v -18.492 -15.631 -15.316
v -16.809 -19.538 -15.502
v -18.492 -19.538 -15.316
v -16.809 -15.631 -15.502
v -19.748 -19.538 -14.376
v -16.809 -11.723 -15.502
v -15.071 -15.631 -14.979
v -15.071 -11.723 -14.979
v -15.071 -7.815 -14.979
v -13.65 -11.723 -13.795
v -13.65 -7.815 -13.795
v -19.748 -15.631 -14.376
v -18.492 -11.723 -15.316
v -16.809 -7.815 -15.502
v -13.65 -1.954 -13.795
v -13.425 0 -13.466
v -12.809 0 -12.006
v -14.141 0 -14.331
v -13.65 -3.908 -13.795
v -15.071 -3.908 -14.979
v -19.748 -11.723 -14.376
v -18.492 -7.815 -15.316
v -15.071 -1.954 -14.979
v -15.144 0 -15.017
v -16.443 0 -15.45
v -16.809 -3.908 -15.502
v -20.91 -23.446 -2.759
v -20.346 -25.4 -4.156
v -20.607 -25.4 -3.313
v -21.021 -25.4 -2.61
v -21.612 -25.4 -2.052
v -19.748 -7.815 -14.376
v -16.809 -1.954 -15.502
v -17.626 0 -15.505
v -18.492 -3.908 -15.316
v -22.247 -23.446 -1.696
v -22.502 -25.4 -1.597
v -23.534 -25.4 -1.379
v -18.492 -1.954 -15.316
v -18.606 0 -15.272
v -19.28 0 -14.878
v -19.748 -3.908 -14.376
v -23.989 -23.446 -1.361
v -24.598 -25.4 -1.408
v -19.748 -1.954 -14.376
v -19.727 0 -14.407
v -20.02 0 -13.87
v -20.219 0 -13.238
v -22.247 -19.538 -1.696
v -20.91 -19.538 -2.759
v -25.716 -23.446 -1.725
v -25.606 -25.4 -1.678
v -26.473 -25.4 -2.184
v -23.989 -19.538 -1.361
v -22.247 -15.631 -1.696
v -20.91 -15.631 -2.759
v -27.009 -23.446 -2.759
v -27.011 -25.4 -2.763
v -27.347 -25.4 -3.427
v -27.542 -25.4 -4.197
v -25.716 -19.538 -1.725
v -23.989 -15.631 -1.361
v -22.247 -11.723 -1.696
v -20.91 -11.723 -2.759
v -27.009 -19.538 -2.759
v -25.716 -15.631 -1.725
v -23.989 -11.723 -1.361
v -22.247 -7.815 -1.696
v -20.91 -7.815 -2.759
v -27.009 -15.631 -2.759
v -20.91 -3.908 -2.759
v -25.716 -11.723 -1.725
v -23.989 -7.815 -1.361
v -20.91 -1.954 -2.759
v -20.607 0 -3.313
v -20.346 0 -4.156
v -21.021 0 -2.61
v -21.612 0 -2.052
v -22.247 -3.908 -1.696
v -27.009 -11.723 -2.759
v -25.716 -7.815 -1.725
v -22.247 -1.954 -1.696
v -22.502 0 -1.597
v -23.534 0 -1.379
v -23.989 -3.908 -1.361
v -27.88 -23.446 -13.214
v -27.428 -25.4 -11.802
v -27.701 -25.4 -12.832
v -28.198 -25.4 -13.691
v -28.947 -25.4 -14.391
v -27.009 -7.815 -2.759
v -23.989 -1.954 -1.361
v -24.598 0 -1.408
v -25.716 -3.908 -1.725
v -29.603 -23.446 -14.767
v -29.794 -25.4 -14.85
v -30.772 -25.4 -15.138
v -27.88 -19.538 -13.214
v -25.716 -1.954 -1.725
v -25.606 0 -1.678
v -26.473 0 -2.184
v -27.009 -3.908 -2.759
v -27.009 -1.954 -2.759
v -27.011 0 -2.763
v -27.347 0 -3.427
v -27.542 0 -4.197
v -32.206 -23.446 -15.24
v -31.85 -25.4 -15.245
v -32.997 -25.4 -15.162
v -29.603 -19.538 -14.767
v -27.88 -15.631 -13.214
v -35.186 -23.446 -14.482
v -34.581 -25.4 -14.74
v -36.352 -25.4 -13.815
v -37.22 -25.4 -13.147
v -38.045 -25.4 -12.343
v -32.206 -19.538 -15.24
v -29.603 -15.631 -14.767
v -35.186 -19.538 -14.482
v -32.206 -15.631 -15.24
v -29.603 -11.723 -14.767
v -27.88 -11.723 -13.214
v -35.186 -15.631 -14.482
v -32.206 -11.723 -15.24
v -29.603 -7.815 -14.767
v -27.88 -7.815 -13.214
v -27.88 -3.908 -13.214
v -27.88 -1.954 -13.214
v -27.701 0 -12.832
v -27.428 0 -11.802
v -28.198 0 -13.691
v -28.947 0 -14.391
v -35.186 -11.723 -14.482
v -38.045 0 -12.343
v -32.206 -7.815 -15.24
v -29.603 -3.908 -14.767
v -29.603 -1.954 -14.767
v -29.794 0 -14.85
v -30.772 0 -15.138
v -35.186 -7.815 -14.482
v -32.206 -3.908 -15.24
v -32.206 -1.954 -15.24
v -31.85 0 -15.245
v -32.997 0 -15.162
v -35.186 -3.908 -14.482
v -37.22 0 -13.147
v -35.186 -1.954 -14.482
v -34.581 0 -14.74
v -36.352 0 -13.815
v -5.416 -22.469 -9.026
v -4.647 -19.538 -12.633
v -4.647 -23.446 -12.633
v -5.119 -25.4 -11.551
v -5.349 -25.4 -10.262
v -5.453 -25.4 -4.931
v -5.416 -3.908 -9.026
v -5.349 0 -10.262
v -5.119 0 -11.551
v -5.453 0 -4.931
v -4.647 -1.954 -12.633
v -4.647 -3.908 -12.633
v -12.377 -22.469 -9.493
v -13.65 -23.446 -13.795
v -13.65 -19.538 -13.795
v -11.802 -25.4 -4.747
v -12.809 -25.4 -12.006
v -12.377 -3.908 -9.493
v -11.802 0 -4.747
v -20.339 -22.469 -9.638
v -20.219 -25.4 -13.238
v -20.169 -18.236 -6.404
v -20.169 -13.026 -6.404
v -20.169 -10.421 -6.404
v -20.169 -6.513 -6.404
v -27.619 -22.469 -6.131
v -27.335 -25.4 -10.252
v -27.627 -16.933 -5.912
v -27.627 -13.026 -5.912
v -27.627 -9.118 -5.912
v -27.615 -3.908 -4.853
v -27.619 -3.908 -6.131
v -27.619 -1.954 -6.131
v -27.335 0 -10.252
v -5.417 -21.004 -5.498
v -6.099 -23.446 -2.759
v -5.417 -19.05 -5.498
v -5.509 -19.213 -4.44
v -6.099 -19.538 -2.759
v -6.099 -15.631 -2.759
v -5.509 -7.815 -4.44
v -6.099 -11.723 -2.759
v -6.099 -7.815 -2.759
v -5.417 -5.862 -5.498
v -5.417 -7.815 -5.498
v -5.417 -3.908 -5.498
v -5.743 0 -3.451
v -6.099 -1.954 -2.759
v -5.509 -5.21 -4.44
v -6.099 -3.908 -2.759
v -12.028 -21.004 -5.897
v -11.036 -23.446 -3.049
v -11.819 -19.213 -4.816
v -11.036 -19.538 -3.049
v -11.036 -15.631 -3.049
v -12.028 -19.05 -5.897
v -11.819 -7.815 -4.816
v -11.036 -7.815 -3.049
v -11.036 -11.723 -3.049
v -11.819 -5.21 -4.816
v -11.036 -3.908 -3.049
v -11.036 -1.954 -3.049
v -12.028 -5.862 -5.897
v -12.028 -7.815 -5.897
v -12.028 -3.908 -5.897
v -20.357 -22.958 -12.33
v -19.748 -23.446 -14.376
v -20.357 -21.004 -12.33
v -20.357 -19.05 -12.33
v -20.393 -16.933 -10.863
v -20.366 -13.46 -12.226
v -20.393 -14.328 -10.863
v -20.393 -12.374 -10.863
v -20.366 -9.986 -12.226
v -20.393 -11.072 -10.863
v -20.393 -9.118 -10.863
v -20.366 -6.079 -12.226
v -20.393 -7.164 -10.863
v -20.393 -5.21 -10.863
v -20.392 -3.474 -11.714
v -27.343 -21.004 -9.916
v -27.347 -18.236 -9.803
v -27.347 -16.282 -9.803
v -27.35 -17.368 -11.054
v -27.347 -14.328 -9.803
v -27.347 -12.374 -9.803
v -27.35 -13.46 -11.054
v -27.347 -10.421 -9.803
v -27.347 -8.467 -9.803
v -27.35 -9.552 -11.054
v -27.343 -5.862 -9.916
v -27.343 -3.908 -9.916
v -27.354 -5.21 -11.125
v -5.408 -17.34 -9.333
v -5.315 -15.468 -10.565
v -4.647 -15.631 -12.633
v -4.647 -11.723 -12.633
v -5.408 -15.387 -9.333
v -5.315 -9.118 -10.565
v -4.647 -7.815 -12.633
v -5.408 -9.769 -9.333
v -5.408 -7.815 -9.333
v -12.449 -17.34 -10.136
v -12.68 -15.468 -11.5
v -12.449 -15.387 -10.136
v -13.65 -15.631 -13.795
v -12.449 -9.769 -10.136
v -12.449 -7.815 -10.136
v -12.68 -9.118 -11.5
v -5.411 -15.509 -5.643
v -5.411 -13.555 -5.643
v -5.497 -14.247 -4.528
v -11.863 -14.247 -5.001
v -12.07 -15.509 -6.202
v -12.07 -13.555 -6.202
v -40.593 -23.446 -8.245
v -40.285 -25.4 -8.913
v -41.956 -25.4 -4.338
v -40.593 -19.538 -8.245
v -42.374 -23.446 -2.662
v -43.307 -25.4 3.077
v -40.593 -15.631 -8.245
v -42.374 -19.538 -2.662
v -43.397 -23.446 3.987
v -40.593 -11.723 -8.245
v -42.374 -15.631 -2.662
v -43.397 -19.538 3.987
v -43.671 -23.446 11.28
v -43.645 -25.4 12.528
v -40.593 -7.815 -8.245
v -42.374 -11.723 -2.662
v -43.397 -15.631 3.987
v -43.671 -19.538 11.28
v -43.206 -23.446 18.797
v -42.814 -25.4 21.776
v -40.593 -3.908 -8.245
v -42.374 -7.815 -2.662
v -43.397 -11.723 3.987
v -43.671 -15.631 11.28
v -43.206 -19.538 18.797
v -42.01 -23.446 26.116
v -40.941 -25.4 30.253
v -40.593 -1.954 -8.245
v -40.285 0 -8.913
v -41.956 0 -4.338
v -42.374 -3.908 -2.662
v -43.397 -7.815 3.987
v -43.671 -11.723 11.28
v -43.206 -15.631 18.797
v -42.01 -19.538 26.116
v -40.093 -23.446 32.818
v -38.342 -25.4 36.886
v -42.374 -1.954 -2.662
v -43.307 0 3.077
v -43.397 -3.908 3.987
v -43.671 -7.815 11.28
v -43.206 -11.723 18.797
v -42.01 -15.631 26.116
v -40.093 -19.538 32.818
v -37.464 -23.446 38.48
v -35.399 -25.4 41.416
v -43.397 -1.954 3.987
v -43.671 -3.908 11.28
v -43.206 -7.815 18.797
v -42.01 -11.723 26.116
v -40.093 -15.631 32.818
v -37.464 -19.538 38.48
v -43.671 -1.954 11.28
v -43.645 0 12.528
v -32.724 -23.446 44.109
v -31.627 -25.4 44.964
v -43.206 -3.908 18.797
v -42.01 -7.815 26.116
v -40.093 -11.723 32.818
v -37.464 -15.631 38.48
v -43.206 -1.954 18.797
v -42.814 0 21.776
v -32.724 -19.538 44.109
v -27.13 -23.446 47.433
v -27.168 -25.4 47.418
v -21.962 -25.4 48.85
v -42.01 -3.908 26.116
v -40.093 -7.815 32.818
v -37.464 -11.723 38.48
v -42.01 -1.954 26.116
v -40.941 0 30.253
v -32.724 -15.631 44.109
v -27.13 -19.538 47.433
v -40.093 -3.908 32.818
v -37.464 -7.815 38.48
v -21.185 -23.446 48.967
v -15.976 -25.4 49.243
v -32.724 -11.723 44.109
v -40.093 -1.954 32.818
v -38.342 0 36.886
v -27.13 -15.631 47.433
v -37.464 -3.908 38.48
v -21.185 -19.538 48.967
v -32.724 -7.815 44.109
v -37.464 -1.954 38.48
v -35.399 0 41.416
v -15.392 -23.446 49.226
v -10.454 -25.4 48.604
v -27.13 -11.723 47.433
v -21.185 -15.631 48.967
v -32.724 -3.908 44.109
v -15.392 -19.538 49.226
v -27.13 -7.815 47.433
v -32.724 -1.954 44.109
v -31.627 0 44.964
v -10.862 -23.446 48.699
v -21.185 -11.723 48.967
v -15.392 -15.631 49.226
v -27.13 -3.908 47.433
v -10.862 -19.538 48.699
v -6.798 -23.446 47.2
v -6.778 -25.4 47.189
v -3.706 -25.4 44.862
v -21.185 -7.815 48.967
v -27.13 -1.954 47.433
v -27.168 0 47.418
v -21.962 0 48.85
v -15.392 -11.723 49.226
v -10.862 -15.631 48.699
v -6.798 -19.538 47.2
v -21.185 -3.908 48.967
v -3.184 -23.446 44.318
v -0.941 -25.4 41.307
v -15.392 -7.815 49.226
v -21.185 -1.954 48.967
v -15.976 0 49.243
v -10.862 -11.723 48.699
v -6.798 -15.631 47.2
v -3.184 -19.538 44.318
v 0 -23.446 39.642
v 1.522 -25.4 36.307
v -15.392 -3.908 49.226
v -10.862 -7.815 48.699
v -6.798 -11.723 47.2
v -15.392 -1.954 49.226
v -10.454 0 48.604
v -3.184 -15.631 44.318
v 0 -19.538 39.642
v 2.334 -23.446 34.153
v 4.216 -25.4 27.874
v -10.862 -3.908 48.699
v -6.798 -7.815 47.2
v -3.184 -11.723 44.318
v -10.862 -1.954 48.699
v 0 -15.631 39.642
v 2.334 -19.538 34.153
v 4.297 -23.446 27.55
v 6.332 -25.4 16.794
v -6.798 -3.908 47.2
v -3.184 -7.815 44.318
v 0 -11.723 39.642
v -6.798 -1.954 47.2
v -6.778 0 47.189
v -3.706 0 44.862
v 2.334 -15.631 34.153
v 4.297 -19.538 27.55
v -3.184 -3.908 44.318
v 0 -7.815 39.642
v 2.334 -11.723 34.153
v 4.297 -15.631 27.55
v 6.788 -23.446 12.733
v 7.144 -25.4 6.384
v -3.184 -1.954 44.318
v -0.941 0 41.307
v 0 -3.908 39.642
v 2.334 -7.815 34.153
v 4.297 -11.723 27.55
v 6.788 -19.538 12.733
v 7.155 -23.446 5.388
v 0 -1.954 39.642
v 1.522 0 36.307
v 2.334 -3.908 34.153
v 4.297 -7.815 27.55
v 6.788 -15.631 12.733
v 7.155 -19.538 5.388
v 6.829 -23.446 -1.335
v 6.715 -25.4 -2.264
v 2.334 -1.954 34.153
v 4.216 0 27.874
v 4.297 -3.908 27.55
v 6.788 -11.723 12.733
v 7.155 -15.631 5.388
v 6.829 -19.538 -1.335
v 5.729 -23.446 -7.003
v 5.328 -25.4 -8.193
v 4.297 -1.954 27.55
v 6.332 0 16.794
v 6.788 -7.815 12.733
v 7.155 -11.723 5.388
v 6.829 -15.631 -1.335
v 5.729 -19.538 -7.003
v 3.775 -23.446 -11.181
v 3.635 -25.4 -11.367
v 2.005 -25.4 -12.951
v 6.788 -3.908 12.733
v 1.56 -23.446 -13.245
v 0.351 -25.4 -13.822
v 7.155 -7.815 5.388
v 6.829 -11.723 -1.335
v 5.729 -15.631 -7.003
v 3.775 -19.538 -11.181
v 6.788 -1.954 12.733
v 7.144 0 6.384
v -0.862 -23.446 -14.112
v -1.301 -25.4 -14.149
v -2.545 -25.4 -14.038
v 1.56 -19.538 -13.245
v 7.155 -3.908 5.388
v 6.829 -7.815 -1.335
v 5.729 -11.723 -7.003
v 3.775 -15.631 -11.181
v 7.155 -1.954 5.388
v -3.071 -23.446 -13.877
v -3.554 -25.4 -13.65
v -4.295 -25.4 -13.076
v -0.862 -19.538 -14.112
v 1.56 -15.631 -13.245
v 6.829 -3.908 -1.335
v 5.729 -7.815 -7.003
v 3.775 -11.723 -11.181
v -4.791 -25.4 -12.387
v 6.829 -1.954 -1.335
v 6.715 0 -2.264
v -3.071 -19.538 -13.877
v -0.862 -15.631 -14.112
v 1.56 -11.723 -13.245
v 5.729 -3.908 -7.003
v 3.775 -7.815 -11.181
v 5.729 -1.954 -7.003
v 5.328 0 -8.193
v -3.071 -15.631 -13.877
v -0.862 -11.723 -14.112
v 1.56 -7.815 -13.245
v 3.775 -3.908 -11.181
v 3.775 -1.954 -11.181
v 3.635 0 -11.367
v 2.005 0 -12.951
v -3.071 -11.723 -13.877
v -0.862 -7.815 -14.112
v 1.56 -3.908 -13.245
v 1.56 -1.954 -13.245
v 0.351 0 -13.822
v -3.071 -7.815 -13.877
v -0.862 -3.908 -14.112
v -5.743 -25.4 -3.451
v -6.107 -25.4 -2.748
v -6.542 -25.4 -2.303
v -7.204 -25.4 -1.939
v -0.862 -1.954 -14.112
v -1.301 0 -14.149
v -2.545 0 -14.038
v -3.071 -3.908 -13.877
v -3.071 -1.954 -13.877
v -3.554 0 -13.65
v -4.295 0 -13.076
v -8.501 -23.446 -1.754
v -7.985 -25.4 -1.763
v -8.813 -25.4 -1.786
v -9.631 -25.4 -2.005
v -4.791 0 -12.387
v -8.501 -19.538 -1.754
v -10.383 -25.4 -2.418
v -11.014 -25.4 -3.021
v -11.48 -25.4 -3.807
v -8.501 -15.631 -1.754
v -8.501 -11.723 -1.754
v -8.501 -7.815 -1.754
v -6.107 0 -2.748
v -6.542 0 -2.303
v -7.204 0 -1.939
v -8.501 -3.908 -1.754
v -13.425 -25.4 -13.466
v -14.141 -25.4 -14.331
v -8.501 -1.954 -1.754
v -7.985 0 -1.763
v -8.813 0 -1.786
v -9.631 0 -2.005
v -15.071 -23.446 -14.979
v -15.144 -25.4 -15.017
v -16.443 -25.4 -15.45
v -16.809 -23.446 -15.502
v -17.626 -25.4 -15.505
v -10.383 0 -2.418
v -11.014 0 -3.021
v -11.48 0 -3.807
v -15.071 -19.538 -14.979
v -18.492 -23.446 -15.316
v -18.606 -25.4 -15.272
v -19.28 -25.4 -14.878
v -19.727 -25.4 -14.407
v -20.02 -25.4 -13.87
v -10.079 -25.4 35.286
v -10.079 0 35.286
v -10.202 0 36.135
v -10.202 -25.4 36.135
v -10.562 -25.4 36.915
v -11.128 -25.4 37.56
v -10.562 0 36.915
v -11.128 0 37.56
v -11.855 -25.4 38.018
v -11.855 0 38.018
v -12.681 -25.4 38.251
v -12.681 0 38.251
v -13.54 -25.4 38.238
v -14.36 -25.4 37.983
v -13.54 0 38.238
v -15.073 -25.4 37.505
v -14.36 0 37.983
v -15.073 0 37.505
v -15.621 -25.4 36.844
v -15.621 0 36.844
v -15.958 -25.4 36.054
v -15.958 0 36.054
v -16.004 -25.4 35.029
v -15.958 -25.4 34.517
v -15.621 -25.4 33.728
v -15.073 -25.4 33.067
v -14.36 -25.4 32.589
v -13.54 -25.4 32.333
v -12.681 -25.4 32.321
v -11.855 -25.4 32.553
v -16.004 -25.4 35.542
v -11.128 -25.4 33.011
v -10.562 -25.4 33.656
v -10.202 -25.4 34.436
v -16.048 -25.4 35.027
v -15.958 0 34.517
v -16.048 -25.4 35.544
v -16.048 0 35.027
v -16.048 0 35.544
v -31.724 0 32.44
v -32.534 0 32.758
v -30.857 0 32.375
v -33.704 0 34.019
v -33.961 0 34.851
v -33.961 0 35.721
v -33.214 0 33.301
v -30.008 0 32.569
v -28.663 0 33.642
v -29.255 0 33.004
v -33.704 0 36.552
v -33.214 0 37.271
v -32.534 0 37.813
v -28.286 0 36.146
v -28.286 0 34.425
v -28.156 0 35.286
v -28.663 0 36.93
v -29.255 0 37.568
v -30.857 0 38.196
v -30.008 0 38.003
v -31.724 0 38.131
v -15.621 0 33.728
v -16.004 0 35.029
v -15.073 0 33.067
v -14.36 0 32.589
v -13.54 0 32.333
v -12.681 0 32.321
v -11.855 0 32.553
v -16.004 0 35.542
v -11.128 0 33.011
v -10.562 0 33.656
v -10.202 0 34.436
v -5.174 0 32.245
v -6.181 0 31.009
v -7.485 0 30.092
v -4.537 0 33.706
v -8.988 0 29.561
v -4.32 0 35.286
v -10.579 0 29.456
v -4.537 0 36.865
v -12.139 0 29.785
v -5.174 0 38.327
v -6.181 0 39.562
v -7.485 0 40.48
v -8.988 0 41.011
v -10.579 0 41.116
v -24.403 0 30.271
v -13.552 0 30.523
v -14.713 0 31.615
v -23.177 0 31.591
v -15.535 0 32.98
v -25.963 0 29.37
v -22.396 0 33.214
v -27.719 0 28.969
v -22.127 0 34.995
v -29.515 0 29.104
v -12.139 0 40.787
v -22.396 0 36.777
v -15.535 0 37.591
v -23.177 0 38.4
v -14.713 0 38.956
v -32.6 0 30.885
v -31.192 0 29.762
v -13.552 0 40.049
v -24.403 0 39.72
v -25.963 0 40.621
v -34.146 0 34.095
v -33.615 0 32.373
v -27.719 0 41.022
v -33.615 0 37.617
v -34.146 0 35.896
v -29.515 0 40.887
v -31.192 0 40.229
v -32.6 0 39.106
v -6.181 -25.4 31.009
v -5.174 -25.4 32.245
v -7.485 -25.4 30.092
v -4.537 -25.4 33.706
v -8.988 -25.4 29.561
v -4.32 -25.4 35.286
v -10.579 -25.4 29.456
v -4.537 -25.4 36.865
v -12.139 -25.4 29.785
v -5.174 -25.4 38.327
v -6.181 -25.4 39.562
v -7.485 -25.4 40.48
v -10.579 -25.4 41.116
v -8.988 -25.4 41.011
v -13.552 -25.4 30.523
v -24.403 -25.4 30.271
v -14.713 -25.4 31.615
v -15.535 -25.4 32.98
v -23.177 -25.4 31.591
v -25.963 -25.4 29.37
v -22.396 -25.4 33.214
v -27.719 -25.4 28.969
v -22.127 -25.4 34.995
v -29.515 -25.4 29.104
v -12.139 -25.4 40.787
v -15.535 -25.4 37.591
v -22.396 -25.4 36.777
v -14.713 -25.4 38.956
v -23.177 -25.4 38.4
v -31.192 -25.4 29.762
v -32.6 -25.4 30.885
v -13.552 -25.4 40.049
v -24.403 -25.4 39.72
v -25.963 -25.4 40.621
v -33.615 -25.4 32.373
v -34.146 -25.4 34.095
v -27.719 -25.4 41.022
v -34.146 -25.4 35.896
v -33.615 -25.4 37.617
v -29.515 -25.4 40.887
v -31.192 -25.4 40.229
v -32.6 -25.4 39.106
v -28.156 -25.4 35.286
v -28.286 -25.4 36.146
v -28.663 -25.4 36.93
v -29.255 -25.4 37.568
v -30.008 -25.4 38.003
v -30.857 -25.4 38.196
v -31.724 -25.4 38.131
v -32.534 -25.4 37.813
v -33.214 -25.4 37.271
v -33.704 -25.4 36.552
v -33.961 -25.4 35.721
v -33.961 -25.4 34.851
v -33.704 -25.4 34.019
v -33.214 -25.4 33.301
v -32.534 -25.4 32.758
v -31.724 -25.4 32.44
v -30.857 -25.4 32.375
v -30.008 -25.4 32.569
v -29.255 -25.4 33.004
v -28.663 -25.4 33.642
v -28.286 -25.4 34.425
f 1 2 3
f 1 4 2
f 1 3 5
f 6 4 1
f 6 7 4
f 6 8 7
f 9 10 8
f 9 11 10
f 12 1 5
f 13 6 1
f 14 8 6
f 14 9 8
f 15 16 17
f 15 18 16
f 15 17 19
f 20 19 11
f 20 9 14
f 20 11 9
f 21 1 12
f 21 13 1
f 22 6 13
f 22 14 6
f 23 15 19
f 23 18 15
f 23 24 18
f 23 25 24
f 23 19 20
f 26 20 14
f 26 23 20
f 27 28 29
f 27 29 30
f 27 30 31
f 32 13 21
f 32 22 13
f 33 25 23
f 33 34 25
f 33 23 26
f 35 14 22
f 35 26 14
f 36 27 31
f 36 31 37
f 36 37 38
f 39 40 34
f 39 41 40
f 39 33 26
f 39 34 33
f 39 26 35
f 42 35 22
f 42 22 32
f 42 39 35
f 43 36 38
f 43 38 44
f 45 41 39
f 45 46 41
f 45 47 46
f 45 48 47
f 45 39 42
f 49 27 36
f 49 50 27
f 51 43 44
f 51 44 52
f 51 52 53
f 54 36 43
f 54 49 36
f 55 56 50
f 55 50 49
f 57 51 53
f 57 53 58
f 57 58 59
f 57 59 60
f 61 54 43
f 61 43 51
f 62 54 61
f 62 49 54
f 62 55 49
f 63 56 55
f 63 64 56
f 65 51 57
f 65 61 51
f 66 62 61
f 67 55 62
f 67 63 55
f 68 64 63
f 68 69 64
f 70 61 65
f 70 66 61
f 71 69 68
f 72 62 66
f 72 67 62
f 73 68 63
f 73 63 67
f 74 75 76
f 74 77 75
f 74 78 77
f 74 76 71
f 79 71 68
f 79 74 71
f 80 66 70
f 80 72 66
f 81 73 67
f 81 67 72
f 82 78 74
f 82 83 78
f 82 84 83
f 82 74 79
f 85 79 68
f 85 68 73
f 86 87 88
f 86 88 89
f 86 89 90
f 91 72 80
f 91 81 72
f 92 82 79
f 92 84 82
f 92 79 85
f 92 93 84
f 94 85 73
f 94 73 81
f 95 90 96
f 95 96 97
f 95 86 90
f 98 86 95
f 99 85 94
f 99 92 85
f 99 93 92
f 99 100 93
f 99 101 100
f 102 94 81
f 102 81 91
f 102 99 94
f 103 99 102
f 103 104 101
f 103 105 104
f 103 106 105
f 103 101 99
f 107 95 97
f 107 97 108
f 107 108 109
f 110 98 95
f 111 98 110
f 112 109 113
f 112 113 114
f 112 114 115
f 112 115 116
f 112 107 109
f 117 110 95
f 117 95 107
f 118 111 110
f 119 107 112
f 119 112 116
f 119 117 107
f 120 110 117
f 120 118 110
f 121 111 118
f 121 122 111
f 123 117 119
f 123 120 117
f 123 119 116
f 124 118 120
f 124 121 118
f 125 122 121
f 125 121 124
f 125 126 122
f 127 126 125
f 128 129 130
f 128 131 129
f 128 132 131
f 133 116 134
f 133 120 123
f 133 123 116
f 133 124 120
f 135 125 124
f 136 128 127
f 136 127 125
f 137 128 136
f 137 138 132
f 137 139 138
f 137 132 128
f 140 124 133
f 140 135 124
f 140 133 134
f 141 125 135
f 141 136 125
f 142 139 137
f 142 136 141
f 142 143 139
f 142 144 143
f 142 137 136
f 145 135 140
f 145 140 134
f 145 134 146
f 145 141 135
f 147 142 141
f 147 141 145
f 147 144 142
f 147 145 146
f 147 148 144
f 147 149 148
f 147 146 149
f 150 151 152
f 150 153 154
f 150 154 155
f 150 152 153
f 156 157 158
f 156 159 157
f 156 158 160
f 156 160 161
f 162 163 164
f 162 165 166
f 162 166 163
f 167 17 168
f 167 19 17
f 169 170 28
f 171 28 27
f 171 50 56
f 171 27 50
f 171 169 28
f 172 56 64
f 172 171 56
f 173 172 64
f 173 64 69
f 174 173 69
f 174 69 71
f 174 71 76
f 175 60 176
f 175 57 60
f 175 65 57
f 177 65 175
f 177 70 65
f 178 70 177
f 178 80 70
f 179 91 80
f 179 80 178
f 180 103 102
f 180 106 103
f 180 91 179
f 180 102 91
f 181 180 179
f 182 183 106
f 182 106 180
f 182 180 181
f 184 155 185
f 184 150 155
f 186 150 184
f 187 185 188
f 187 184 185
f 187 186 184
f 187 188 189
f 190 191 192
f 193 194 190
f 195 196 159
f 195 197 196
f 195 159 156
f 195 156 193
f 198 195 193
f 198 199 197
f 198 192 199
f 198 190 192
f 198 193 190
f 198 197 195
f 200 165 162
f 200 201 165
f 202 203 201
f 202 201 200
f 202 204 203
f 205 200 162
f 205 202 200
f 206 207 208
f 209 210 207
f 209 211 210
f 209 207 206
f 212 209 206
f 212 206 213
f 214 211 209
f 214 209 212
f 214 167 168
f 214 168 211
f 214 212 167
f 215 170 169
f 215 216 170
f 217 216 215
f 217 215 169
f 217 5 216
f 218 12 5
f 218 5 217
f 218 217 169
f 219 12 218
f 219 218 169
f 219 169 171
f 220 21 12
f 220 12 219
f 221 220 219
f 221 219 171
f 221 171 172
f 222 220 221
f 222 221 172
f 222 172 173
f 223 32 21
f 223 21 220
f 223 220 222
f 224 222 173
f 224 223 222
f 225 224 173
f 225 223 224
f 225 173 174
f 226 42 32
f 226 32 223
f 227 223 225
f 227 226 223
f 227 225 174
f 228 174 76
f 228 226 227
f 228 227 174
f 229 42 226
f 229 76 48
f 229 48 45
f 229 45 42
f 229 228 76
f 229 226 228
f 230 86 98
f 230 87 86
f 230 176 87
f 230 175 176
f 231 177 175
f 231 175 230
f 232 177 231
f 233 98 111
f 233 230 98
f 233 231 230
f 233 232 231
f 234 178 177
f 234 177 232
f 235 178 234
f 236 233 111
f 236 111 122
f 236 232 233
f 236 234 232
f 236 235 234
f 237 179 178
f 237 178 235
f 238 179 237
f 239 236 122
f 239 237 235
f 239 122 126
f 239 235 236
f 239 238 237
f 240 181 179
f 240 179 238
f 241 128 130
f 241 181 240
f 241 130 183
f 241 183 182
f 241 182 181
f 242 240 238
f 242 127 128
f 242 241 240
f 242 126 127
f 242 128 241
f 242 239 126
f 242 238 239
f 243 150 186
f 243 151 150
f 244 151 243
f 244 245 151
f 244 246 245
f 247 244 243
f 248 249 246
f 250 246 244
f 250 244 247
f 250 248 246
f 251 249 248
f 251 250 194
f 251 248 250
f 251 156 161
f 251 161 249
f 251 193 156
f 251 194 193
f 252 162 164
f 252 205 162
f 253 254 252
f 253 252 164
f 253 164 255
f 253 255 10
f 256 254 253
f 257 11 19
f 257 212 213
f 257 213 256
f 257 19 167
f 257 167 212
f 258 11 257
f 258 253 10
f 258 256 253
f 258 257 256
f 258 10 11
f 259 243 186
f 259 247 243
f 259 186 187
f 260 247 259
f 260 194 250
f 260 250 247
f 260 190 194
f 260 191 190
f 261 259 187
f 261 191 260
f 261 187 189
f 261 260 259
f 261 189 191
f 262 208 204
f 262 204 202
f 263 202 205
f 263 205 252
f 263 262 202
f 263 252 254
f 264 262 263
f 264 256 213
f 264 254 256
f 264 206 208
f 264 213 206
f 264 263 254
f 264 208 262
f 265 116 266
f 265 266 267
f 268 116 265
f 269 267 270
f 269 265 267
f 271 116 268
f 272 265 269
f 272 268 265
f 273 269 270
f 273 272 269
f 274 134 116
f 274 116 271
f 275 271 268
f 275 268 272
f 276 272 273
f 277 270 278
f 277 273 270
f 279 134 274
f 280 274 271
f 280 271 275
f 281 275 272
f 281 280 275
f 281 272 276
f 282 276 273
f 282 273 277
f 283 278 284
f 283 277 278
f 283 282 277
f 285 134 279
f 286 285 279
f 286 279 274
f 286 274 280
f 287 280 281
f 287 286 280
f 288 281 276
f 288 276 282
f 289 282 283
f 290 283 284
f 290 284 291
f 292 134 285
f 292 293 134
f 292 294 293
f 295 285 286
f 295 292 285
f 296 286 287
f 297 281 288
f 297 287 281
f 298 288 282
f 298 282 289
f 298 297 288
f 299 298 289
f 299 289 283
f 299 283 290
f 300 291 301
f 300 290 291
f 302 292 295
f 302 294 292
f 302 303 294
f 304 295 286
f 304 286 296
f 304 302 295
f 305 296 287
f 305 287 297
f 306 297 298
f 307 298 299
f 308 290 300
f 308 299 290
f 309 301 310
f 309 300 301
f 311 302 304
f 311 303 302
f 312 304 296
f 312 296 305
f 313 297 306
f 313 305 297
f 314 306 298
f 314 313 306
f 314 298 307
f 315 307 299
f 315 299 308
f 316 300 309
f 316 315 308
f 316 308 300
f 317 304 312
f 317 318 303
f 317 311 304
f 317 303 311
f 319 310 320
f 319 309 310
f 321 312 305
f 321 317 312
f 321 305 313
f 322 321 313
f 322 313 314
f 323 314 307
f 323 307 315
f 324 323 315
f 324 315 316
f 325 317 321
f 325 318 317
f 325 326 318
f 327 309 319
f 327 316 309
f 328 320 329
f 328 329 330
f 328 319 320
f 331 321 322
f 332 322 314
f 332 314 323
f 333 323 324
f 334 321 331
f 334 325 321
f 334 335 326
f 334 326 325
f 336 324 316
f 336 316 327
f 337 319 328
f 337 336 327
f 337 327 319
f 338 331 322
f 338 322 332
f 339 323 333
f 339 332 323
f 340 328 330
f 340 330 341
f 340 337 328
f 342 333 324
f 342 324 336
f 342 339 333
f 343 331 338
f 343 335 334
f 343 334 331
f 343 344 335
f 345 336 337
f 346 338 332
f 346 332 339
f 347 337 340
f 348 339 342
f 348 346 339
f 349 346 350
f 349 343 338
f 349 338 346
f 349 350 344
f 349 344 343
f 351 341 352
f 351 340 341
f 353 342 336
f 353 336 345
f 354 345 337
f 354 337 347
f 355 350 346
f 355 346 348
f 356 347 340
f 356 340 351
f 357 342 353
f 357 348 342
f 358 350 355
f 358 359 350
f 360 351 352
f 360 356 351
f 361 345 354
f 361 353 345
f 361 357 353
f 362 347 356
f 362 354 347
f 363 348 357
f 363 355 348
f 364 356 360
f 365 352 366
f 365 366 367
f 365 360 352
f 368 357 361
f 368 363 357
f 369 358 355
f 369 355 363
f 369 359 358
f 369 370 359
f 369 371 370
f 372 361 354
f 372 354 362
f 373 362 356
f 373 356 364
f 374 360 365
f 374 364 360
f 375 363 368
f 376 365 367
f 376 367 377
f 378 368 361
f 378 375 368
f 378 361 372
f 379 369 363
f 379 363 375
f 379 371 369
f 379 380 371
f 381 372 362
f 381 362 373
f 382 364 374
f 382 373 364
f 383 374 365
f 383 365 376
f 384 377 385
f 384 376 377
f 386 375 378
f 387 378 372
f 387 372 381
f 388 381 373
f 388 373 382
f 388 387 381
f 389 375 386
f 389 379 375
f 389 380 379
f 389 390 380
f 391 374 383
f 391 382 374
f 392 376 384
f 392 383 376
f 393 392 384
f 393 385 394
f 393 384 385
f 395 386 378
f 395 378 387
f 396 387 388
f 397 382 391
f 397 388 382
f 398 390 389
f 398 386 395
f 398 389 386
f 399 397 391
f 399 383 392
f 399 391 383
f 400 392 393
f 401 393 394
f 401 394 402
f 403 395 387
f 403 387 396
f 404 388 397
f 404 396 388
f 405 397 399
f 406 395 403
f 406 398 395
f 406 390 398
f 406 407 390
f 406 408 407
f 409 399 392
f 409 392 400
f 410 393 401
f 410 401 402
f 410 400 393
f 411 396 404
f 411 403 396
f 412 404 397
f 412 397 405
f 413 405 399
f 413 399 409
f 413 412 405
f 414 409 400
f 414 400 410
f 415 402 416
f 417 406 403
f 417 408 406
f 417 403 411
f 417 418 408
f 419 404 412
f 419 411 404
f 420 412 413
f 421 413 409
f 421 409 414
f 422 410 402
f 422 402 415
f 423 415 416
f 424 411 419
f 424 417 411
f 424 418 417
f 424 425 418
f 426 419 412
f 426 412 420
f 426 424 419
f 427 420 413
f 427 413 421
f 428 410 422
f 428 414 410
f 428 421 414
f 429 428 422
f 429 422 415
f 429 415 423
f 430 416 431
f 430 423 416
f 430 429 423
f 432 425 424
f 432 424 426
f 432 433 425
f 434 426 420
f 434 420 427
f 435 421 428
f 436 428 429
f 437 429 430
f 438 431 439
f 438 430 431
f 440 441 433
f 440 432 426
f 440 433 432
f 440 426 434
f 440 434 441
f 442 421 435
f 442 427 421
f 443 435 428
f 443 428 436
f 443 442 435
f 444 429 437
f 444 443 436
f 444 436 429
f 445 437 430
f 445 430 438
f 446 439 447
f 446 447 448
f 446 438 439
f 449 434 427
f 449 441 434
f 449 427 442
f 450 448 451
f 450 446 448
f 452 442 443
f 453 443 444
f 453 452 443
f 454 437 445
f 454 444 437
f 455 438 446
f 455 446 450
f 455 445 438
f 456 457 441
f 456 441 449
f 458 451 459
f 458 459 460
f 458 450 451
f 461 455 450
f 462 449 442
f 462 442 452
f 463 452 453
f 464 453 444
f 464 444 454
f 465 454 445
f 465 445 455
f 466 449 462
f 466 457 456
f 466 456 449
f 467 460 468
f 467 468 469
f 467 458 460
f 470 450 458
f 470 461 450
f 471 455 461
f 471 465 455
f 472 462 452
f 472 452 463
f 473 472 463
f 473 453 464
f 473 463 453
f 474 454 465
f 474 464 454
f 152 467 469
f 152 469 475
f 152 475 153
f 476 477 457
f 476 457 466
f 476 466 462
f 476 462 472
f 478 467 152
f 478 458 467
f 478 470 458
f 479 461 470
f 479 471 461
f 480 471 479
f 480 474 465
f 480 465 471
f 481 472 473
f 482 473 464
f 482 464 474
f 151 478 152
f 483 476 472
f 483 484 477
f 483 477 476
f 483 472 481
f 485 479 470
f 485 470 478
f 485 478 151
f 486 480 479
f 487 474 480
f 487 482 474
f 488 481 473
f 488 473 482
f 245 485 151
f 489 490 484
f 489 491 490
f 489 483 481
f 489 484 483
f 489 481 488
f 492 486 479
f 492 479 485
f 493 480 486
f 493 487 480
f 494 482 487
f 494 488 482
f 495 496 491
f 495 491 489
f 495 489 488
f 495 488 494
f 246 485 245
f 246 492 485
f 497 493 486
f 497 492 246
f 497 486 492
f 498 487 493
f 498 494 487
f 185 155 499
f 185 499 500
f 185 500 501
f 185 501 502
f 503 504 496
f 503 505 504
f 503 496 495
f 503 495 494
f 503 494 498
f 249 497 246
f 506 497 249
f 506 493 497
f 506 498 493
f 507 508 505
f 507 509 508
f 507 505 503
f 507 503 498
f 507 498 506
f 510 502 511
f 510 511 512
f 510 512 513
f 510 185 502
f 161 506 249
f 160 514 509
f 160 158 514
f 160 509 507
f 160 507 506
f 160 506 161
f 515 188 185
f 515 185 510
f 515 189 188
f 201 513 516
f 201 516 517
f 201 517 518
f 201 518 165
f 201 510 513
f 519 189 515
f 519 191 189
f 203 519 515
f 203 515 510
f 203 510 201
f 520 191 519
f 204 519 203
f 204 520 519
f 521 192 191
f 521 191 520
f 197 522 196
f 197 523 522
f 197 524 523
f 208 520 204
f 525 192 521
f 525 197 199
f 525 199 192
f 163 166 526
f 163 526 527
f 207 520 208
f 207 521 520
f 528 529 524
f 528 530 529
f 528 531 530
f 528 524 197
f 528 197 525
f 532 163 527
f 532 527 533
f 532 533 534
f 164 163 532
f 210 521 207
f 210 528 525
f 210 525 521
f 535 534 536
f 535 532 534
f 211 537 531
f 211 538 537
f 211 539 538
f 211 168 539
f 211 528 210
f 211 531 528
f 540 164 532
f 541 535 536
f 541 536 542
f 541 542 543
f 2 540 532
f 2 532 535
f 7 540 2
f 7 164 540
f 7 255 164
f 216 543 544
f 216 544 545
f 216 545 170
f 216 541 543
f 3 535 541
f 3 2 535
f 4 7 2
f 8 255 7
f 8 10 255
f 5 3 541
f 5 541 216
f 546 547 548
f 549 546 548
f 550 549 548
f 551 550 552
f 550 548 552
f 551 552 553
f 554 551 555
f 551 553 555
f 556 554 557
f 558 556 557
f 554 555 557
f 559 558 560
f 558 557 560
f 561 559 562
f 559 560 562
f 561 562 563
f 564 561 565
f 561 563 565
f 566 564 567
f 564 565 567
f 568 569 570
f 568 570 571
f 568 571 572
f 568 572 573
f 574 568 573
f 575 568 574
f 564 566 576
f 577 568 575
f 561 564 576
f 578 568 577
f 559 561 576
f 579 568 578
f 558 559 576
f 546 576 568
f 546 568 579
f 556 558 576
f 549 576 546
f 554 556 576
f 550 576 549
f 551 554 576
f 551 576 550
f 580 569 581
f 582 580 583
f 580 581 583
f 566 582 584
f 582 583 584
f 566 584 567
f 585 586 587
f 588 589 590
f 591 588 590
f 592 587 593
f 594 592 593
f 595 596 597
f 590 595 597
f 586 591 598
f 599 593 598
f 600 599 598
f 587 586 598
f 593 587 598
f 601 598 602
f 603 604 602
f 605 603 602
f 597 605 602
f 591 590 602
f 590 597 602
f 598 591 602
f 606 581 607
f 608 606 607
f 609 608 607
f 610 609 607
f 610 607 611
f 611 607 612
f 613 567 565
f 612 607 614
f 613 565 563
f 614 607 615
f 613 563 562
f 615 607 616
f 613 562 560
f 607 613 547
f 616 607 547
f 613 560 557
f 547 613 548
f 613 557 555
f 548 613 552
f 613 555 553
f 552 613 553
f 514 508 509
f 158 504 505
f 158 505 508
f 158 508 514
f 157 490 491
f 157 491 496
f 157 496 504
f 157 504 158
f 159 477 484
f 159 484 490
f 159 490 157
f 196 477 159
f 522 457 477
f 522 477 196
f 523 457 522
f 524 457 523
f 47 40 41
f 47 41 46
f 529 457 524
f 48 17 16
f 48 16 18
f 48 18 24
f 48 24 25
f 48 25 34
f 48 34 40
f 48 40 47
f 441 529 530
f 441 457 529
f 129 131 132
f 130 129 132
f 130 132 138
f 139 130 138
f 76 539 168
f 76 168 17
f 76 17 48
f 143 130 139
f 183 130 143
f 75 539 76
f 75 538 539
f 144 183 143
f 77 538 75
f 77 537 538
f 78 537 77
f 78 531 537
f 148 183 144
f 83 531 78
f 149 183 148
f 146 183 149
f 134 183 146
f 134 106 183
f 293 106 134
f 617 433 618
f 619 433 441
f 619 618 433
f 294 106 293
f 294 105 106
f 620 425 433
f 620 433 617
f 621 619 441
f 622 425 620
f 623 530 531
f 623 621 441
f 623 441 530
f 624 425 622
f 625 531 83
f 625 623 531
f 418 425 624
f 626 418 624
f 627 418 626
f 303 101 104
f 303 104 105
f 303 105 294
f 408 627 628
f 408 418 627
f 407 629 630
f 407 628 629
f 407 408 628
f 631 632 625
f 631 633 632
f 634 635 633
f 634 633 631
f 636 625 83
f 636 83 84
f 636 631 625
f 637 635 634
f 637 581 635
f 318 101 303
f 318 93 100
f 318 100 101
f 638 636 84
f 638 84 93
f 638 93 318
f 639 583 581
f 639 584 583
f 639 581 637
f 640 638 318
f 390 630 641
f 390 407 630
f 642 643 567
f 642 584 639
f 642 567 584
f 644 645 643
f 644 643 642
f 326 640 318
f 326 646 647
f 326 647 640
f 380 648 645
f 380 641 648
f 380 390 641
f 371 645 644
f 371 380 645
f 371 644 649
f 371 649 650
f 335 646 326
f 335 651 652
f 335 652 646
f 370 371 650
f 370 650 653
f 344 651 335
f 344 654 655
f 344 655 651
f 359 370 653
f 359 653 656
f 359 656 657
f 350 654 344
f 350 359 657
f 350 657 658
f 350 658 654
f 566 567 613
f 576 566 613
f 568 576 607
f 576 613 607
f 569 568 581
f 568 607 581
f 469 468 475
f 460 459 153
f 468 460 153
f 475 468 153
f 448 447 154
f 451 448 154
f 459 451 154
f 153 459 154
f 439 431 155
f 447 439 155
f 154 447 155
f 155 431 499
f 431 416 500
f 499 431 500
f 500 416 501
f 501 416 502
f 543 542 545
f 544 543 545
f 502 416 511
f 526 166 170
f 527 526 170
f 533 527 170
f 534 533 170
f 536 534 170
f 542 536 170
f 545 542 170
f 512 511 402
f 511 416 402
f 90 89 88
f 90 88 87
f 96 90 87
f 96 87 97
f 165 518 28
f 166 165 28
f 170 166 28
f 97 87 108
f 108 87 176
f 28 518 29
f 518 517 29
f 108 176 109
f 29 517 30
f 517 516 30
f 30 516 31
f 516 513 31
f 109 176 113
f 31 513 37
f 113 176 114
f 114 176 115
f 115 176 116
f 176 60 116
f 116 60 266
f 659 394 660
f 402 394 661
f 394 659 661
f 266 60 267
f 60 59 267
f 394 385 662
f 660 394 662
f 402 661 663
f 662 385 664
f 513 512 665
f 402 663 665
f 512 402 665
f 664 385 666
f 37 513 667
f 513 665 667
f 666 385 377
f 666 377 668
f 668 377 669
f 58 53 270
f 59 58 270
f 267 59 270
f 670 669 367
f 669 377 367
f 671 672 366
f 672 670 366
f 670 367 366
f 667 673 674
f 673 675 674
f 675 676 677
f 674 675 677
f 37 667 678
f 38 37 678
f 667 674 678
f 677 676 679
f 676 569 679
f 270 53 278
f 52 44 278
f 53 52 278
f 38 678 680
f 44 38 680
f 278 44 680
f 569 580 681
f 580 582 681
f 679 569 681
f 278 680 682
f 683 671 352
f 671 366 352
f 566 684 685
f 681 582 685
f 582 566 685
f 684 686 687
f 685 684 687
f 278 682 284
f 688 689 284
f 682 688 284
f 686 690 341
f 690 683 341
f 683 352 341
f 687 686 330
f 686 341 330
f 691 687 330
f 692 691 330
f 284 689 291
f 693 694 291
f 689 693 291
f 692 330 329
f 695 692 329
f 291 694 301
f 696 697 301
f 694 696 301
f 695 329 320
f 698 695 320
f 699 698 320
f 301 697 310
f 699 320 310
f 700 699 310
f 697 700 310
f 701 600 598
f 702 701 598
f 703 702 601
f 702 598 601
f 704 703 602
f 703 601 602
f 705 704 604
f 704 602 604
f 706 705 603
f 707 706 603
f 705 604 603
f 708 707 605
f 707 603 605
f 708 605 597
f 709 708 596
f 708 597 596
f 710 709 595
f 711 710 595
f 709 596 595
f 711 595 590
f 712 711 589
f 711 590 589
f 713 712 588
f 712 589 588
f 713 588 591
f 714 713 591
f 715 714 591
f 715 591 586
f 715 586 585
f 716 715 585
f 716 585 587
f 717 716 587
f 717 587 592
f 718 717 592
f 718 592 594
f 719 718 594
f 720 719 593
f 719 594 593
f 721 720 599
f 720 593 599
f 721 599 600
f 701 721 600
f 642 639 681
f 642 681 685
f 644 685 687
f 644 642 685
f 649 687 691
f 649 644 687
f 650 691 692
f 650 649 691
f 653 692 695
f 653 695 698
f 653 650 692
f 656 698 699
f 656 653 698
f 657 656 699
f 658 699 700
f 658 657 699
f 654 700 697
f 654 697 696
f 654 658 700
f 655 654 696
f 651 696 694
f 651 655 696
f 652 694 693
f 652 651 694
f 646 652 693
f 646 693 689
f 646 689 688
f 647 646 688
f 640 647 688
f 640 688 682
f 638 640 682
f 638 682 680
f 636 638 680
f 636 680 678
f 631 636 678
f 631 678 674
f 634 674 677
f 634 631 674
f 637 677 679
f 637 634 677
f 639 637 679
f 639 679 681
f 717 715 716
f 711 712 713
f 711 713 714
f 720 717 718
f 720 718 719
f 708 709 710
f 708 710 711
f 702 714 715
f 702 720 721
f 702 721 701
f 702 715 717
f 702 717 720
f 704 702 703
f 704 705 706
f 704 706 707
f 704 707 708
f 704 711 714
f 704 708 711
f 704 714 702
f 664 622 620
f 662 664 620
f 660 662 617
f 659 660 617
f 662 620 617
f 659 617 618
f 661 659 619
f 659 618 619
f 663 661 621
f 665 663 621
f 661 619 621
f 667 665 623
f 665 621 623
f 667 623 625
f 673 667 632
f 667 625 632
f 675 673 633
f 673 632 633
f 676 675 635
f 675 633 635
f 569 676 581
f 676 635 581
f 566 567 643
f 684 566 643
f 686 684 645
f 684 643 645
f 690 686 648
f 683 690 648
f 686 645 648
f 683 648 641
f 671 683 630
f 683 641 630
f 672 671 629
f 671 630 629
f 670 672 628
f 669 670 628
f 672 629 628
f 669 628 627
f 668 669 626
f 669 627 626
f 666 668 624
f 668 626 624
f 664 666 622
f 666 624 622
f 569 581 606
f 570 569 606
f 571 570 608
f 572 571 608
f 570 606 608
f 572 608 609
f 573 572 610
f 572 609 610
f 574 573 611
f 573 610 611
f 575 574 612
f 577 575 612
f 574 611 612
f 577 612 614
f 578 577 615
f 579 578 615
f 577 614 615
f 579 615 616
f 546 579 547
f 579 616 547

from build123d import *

# Parameters (mm, degrees)
F0_R     = 6.0431919973
F1_DEPTH = 25.4
F0_R_2   = 2.9186598428


with BuildPart() as f1:
    # F0 (on Front) → F1 (new body)
    with BuildSketch(Plane.XZ):
        with BuildLine():
            add(Edge.make_bspline(
                [(-38.0446836352, -12.3427407816), (-45.8718230915, -3.7724575686), (-45.0985940397, 45.2332393793), (-14.9302426385, 51.0057128408), (4.5313178015, 44.3489239628), (11.6491762621, -14.4053939947), (-7.8029565367, -15.0852006309), (-3.4150529093, -1.0878406693), (-13.7409969829, -1.6653001257), (-10.6597108632, -15.3174777), (-23.154566088, -16.6431857899), (-17.3630462788, -0.7003596263), (-30.3811789456, -1.0828250538), (-24.1265142603, -15.6920927165), (-34.5379830585, -16.182383253), (-38.0446836352, -12.3427407816)],
                knots=[0, 0, 0, 0, 0.1428496765, 0.2421262111, 0.327447321, 0.4704889987, 0.5290657875, 0.5923664898, 0.6369265318, 0.7035593336, 0.7531541164, 0.8216171907, 0.8711001547, 0.9360007515, 1, 1, 1, 1], degree=3))
        make_face()
        with Locations((-28.1704906374, 34.9952988327)):
            Circle(F0_R, mode=Mode.SUBTRACT)
        with BuildLine():
            ThreePointArc((-15.9584378498, 36.0539526358), (-9.779657243, 41.117565315), (-4.3200722161, 35.285718739))
            ThreePointArc((-4.3200722161, 35.285718739), (-9.779657243, 29.4538721631), (-15.9584378498, 34.5174848423))
            ThreePointArc((-15.9584378498, 34.5174848423), (-16.0588145512, 35.285718739), (-15.9584378498, 36.0539526358))
        make_face(mode=Mode.SUBTRACT)
    extrude(amount=F1_DEPTH)


with BuildPart() as f1b:
    # F0 (on Front) → F1, piece 2 (new body)
    with BuildSketch(Plane.XZ):
        with Locations((-31.0746654868, 35.285718739)):
            Circle(F0_R_2)
    extrude(amount=F1_DEPTH)


with BuildPart() as f1c:
    # F0 (on Front) → F1, piece 3 (new body)
    with BuildSketch(Plane.XZ):
        with BuildLine():
            ThreePointArc((-10.0787535054, 35.285718739), (-12.6814021746, 38.2505488906), (-15.9584378498, 36.0539526358))
            ThreePointArc((-15.9584378498, 36.0539526358), (-16.0091480043, 35.285718739), (-15.9584378498, 34.5174848423))
            ThreePointArc((-15.9584378498, 34.5174848423), (-12.6814021746, 32.3208885875), (-10.0787535054, 35.285718739))
        make_face()
    extrude(amount=F1_DEPTH)


solid = Compound([f1.part, f1b.part, f1c.part])
